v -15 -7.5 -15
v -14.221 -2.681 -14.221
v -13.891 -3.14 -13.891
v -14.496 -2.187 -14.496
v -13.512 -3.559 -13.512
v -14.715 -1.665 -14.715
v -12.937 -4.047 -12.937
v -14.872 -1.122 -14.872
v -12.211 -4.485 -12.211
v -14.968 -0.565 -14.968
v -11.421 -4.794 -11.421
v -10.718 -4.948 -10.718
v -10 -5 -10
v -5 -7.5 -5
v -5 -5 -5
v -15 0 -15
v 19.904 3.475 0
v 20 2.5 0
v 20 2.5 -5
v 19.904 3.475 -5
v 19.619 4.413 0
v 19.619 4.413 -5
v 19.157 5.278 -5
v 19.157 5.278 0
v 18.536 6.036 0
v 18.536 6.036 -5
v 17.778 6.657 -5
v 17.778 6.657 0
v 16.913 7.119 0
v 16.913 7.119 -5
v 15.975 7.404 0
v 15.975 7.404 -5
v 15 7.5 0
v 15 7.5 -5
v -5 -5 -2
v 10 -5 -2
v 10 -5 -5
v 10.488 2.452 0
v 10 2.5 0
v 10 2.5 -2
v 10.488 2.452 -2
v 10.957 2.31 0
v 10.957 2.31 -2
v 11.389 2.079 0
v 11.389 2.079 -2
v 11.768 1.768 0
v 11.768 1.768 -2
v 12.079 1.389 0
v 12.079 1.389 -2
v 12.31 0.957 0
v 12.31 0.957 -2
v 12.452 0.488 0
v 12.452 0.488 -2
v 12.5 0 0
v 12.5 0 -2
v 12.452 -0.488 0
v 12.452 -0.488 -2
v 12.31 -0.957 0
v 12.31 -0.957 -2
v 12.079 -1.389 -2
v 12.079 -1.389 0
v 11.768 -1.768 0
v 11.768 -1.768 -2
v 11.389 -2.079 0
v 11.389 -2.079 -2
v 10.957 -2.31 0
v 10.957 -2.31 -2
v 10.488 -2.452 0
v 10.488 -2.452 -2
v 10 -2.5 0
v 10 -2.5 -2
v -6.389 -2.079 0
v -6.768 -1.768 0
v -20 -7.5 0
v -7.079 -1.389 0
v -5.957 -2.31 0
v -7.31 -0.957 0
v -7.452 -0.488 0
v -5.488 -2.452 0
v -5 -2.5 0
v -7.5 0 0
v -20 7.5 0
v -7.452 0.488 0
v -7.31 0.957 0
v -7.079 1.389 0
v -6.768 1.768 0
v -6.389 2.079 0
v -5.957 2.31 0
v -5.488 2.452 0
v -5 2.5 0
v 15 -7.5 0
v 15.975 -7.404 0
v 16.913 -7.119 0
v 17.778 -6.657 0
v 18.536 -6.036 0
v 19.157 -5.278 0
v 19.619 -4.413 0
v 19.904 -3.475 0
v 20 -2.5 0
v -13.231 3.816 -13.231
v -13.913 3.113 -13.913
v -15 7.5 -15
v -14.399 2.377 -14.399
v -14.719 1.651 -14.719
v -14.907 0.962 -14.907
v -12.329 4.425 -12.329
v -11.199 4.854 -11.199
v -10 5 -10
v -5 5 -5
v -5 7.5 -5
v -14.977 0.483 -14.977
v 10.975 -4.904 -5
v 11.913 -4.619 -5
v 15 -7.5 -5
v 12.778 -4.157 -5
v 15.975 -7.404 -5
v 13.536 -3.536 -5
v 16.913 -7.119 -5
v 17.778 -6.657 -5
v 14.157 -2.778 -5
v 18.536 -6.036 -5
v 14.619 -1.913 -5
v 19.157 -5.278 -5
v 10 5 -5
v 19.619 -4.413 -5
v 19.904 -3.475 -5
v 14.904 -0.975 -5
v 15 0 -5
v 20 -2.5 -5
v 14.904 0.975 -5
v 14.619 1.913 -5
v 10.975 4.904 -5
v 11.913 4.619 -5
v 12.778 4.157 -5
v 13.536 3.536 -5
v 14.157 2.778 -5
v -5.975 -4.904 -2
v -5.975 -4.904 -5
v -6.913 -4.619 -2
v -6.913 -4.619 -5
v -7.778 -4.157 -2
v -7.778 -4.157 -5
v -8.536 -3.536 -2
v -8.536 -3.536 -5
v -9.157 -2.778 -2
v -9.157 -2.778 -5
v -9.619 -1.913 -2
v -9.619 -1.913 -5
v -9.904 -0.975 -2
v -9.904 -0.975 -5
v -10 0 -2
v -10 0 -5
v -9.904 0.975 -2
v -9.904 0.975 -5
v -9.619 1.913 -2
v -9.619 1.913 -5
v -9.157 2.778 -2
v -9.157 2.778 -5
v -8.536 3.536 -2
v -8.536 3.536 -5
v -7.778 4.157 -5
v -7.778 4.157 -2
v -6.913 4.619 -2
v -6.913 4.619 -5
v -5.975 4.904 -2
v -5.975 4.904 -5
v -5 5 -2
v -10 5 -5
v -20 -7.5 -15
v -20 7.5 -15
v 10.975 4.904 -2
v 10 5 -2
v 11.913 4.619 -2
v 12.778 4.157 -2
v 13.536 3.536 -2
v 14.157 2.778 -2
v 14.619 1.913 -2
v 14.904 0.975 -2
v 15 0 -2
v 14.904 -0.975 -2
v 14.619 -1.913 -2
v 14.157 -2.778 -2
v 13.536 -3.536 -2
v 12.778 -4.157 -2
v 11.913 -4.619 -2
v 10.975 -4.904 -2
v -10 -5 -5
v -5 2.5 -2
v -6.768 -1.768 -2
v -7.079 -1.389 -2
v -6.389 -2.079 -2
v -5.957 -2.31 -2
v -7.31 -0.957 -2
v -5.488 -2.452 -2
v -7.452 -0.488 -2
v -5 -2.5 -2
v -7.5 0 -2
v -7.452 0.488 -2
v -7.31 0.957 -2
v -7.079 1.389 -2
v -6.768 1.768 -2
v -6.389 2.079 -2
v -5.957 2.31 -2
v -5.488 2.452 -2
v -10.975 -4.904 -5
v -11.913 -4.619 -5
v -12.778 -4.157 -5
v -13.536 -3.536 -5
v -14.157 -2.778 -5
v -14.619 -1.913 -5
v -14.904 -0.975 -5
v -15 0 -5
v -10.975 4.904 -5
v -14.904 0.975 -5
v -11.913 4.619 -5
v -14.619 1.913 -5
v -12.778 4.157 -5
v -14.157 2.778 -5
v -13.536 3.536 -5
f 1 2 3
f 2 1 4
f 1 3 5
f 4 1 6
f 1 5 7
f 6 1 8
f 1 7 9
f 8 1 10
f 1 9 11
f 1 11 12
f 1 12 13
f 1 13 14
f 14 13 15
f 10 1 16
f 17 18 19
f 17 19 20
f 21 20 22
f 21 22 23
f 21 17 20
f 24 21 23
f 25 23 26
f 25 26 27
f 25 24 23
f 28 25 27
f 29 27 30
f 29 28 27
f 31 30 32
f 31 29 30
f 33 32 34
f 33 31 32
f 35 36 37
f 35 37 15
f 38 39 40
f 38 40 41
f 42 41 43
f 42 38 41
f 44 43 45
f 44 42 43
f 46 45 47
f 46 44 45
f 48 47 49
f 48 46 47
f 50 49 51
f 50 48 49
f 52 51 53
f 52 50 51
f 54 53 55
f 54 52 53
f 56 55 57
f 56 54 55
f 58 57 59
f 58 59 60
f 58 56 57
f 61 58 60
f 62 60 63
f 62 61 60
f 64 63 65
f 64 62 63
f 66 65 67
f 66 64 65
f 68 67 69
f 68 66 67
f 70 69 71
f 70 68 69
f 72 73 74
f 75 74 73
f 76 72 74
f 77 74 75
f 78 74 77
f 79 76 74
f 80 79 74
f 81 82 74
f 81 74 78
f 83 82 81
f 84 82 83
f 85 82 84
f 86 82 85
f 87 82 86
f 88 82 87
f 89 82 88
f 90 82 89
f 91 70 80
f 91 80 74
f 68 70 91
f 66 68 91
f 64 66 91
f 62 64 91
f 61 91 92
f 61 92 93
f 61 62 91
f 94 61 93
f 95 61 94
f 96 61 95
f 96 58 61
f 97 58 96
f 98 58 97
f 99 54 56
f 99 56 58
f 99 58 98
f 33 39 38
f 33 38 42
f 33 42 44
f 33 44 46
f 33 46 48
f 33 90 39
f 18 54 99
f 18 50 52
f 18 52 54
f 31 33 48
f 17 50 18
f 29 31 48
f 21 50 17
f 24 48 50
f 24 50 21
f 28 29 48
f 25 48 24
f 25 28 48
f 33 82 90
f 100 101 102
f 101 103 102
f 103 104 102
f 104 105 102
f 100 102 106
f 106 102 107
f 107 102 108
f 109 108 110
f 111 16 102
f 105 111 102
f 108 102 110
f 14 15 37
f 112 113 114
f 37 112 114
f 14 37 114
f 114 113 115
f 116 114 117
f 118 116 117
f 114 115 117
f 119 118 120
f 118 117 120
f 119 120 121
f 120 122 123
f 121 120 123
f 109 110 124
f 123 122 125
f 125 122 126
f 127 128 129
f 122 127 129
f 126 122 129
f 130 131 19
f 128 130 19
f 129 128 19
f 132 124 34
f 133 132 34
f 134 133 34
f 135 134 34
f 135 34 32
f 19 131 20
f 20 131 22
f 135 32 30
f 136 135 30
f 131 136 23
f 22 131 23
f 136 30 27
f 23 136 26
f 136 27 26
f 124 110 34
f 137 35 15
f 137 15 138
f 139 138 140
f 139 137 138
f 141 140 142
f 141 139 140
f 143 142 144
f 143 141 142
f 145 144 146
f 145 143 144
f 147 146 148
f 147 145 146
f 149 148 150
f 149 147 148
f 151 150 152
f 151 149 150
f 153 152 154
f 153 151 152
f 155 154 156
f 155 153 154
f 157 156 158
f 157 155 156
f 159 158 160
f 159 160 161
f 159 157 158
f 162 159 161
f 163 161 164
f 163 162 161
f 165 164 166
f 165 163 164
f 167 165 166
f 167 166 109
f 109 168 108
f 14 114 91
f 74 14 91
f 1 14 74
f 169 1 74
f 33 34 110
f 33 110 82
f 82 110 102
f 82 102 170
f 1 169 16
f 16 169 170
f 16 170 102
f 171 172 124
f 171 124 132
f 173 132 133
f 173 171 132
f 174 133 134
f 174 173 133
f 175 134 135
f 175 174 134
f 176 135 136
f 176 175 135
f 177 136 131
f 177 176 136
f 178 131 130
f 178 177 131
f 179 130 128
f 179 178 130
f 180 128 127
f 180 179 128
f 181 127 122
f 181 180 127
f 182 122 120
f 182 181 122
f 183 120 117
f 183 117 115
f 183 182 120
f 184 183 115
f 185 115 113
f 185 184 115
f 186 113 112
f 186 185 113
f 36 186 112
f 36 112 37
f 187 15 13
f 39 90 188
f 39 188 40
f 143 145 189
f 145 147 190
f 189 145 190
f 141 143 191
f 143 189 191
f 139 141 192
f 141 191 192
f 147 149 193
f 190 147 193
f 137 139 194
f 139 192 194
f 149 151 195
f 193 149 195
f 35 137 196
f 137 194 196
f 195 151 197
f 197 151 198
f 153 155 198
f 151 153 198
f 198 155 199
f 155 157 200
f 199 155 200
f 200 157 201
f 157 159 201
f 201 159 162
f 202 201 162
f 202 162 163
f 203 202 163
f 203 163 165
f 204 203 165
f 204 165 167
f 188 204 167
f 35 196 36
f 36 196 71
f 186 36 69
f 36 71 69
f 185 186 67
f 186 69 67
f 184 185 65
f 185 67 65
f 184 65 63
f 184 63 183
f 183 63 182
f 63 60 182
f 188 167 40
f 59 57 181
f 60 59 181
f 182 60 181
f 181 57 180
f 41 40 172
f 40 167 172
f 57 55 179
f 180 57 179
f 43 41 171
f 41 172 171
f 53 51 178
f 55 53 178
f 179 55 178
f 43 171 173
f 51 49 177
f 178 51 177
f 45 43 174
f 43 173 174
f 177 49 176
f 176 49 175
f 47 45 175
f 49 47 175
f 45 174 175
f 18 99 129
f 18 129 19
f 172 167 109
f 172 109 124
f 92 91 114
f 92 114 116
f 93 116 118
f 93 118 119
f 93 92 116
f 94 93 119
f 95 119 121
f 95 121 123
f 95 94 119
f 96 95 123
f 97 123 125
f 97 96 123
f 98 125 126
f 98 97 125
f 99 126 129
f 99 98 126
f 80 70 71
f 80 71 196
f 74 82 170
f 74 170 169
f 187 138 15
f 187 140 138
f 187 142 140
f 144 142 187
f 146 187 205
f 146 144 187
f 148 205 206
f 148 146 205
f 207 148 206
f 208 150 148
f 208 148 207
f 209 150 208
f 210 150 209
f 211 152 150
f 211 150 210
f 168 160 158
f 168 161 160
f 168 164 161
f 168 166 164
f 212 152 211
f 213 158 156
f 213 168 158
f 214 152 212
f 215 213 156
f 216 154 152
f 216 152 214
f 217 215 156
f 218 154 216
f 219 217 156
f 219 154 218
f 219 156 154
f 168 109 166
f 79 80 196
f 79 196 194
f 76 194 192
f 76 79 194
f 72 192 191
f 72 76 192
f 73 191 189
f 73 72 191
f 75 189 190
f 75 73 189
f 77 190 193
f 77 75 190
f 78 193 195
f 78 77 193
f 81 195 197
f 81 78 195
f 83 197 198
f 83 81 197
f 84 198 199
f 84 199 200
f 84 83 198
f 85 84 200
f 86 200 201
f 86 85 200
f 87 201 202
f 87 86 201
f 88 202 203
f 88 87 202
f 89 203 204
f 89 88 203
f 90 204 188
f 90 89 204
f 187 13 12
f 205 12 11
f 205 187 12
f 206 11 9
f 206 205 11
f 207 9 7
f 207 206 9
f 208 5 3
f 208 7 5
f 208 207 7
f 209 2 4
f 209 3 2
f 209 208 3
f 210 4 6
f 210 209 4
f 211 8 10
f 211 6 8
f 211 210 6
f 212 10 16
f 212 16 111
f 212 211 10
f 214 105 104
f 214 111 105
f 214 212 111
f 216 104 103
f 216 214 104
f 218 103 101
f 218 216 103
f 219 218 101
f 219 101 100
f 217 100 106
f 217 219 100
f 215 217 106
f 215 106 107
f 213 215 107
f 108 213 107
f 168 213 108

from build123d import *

# Parameters (mm, degrees)
EXTRUDE_1_DEPTH     = 2
EXTRUDE_2_DEPTH     = 5
EXTRUDE_3_DEPTH     = 15
EXTRUDE_4_DEPTH     = 15
CUT_EXTRUDE_START   = -5
CUT_EXTRUDE_1_DEPTH = 15


with BuildPart() as part:
    # Sketch 1 → Extrude 1 (new body)
    with BuildSketch(Plane.XY):
        with BuildLine():
            Line((-20, -7.5), (15, -7.5))
            ThreePointArc((15, -7.5), (18.535533906, -6.035533906), (20, -2.5))
            Line((20, -2.5), (20, 2.5))
            ThreePointArc((20, 2.5), (18.535533906, 6.035533906), (15, 7.5))
            Line((15, 7.5), (-20, 7.5))
            Line((-20, 7.5), (-20, -7.5))
        make_face()
        with BuildLine():
            Line((-5, 2.5), (10, 2.5))
            ThreePointArc((10, 2.5), (12.5, 0), (10, -2.5))
            Line((10, -2.5), (-5, -2.5))
            ThreePointArc((-5, -2.5), (-7.5, 0), (-5, 2.5))
        make_face(mode=Mode.SUBTRACT)
    extrude(amount=-EXTRUDE_1_DEPTH)

    # Sketch 1_3 → Extrude 2 (add)
    with BuildSketch(Plane.XY):
        with BuildLine():
            Line((15, 7.5), (-20, 7.5))
            Line((-20, 7.5), (-20, -7.5))
            Line((-20, -7.5), (15, -7.5))
            ThreePointArc((15, -7.5), (18.535533906, -6.035533906), (20, -2.5))
            Line((20, -2.5), (20, 2.5))
            ThreePointArc((20, 2.5), (18.535533906, 6.035533906), (15, 7.5))
        make_face()
        with BuildLine():
            ThreePointArc((-5, -5), (-10, 0), (-5, 5))
            Line((-5, 5), (10, 5))
            ThreePointArc((10, 5), (15, 0), (10, -5))
            Line((10, -5), (-5, -5))
        make_face(mode=Mode.SUBTRACT)
    extrude(amount=-EXTRUDE_2_DEPTH)

    # Sketch 1_4 → Extrude 3 (add)
    with BuildSketch(Plane.XY):
        Polygon((-15, 0), (-15, 7.5), (-20, 7.5), (-20, -7.5), (-15, -7.5), align=None)
    extrude(amount=-EXTRUDE_3_DEPTH)

    # Sketch 2 → Extrude 4 (add)
    with BuildSketch(Plane(origin=(0, 7.5, 0), x_dir=(1, 0, 0), z_dir=(0, 1, 0))):
        Polygon((-15, 15), (-5, 5), (-15, 5), align=None)
    extrude(amount=-EXTRUDE_4_DEPTH)

    # Sketch 1_5 → Cut-Extrude 1 (cut)
    with BuildSketch(Plane.XY.offset(CUT_EXTRUDE_START)):
        with BuildLine():
            Line((-10, 5), (10, 5))
            ThreePointArc((10, 5), (15, 0), (10, -5))
            Line((10, -5), (-10, -5))
            ThreePointArc((-10, -5), (-15, 0), (-10, 5))
        make_face()
    extrude(amount=-CUT_EXTRUDE_1_DEPTH, mode=Mode.SUBTRACT)


solid = part.part
